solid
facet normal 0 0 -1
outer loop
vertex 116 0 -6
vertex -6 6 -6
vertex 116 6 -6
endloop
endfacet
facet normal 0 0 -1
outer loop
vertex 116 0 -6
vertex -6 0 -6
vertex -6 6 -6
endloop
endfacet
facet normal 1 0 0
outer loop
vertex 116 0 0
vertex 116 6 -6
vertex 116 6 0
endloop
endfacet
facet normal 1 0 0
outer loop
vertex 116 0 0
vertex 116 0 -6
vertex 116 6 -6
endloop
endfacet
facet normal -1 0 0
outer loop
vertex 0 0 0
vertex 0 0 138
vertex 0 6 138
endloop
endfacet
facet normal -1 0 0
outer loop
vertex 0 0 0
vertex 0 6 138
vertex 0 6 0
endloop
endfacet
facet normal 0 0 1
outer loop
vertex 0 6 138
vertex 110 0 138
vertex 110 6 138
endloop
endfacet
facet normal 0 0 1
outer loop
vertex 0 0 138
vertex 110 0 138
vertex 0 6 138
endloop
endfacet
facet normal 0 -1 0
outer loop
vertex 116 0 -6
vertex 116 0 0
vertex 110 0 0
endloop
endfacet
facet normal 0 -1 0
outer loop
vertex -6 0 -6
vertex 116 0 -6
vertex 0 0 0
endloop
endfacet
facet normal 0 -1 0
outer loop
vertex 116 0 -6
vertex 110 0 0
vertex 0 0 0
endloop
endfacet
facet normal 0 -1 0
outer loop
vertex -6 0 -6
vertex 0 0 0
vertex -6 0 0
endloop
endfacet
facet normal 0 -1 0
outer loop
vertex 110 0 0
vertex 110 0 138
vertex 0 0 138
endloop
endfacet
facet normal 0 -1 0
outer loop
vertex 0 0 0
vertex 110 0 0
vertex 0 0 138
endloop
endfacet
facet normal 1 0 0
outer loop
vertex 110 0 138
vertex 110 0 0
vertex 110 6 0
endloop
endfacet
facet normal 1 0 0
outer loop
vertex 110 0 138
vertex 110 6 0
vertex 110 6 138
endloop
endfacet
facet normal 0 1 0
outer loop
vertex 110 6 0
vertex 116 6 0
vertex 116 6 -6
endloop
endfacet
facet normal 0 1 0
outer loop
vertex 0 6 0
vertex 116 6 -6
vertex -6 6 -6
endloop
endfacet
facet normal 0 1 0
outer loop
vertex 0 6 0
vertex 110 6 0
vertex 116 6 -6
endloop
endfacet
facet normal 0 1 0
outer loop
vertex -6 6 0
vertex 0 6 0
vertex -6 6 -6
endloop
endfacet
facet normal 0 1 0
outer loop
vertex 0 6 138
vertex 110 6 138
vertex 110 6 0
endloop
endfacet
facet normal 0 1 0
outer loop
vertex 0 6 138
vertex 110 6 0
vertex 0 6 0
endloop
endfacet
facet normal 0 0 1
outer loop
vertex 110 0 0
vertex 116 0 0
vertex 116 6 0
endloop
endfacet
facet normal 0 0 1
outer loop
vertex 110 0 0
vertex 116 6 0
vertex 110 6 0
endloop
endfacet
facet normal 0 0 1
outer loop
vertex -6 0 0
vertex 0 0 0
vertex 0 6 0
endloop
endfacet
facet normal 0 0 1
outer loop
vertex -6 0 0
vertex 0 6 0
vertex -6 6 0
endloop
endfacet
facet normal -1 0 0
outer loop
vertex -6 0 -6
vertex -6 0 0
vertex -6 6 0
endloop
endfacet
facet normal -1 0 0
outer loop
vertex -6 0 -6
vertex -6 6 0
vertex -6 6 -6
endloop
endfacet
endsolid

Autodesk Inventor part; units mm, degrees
ref_plane "YZ Plane" through (0, 0, 0) normal (1, 0, 0) x (0, 1, 0)
ref_plane "XZ Plane" through (0, 0, 0) normal (0, 1, 0) x (-1, 0, 0)
ref_plane "XY Plane" through (0, 0, 0) normal (0, 0, 1) x (1, 0, 0)
sketch "Sketch1" plane through (0, 0, 0) normal (0, 1, 0) x (-1, 0, 0)
  line L0 (0, 0) -> (6, 0)
  line L1 (6, 0) -> (6, -6)
  line L2 (6, -6) -> (0, -6)
  line L3 (0, -6) -> (0, 0)
  line L4 (0, -6) -> (-55, -6)
  line L5 (-55, -6) -> (-55, 138)
  line L6 (-55, 138) -> (0, 138)
  line L7 (0, 138) -> (0, -6)
  dimension "d0" = 6
  dimension "d1" = 6
  dimension "d2" = 55
  dimension "d3" = 144
extrude "Extrusion1" add sketch "Sketch1" along normal blind 6
mirror "Mirror1" about plane through (55, 0, 138) normal (1, 0, 0) of "Extrusion1"
properties part number "wall 4 for sorting"
